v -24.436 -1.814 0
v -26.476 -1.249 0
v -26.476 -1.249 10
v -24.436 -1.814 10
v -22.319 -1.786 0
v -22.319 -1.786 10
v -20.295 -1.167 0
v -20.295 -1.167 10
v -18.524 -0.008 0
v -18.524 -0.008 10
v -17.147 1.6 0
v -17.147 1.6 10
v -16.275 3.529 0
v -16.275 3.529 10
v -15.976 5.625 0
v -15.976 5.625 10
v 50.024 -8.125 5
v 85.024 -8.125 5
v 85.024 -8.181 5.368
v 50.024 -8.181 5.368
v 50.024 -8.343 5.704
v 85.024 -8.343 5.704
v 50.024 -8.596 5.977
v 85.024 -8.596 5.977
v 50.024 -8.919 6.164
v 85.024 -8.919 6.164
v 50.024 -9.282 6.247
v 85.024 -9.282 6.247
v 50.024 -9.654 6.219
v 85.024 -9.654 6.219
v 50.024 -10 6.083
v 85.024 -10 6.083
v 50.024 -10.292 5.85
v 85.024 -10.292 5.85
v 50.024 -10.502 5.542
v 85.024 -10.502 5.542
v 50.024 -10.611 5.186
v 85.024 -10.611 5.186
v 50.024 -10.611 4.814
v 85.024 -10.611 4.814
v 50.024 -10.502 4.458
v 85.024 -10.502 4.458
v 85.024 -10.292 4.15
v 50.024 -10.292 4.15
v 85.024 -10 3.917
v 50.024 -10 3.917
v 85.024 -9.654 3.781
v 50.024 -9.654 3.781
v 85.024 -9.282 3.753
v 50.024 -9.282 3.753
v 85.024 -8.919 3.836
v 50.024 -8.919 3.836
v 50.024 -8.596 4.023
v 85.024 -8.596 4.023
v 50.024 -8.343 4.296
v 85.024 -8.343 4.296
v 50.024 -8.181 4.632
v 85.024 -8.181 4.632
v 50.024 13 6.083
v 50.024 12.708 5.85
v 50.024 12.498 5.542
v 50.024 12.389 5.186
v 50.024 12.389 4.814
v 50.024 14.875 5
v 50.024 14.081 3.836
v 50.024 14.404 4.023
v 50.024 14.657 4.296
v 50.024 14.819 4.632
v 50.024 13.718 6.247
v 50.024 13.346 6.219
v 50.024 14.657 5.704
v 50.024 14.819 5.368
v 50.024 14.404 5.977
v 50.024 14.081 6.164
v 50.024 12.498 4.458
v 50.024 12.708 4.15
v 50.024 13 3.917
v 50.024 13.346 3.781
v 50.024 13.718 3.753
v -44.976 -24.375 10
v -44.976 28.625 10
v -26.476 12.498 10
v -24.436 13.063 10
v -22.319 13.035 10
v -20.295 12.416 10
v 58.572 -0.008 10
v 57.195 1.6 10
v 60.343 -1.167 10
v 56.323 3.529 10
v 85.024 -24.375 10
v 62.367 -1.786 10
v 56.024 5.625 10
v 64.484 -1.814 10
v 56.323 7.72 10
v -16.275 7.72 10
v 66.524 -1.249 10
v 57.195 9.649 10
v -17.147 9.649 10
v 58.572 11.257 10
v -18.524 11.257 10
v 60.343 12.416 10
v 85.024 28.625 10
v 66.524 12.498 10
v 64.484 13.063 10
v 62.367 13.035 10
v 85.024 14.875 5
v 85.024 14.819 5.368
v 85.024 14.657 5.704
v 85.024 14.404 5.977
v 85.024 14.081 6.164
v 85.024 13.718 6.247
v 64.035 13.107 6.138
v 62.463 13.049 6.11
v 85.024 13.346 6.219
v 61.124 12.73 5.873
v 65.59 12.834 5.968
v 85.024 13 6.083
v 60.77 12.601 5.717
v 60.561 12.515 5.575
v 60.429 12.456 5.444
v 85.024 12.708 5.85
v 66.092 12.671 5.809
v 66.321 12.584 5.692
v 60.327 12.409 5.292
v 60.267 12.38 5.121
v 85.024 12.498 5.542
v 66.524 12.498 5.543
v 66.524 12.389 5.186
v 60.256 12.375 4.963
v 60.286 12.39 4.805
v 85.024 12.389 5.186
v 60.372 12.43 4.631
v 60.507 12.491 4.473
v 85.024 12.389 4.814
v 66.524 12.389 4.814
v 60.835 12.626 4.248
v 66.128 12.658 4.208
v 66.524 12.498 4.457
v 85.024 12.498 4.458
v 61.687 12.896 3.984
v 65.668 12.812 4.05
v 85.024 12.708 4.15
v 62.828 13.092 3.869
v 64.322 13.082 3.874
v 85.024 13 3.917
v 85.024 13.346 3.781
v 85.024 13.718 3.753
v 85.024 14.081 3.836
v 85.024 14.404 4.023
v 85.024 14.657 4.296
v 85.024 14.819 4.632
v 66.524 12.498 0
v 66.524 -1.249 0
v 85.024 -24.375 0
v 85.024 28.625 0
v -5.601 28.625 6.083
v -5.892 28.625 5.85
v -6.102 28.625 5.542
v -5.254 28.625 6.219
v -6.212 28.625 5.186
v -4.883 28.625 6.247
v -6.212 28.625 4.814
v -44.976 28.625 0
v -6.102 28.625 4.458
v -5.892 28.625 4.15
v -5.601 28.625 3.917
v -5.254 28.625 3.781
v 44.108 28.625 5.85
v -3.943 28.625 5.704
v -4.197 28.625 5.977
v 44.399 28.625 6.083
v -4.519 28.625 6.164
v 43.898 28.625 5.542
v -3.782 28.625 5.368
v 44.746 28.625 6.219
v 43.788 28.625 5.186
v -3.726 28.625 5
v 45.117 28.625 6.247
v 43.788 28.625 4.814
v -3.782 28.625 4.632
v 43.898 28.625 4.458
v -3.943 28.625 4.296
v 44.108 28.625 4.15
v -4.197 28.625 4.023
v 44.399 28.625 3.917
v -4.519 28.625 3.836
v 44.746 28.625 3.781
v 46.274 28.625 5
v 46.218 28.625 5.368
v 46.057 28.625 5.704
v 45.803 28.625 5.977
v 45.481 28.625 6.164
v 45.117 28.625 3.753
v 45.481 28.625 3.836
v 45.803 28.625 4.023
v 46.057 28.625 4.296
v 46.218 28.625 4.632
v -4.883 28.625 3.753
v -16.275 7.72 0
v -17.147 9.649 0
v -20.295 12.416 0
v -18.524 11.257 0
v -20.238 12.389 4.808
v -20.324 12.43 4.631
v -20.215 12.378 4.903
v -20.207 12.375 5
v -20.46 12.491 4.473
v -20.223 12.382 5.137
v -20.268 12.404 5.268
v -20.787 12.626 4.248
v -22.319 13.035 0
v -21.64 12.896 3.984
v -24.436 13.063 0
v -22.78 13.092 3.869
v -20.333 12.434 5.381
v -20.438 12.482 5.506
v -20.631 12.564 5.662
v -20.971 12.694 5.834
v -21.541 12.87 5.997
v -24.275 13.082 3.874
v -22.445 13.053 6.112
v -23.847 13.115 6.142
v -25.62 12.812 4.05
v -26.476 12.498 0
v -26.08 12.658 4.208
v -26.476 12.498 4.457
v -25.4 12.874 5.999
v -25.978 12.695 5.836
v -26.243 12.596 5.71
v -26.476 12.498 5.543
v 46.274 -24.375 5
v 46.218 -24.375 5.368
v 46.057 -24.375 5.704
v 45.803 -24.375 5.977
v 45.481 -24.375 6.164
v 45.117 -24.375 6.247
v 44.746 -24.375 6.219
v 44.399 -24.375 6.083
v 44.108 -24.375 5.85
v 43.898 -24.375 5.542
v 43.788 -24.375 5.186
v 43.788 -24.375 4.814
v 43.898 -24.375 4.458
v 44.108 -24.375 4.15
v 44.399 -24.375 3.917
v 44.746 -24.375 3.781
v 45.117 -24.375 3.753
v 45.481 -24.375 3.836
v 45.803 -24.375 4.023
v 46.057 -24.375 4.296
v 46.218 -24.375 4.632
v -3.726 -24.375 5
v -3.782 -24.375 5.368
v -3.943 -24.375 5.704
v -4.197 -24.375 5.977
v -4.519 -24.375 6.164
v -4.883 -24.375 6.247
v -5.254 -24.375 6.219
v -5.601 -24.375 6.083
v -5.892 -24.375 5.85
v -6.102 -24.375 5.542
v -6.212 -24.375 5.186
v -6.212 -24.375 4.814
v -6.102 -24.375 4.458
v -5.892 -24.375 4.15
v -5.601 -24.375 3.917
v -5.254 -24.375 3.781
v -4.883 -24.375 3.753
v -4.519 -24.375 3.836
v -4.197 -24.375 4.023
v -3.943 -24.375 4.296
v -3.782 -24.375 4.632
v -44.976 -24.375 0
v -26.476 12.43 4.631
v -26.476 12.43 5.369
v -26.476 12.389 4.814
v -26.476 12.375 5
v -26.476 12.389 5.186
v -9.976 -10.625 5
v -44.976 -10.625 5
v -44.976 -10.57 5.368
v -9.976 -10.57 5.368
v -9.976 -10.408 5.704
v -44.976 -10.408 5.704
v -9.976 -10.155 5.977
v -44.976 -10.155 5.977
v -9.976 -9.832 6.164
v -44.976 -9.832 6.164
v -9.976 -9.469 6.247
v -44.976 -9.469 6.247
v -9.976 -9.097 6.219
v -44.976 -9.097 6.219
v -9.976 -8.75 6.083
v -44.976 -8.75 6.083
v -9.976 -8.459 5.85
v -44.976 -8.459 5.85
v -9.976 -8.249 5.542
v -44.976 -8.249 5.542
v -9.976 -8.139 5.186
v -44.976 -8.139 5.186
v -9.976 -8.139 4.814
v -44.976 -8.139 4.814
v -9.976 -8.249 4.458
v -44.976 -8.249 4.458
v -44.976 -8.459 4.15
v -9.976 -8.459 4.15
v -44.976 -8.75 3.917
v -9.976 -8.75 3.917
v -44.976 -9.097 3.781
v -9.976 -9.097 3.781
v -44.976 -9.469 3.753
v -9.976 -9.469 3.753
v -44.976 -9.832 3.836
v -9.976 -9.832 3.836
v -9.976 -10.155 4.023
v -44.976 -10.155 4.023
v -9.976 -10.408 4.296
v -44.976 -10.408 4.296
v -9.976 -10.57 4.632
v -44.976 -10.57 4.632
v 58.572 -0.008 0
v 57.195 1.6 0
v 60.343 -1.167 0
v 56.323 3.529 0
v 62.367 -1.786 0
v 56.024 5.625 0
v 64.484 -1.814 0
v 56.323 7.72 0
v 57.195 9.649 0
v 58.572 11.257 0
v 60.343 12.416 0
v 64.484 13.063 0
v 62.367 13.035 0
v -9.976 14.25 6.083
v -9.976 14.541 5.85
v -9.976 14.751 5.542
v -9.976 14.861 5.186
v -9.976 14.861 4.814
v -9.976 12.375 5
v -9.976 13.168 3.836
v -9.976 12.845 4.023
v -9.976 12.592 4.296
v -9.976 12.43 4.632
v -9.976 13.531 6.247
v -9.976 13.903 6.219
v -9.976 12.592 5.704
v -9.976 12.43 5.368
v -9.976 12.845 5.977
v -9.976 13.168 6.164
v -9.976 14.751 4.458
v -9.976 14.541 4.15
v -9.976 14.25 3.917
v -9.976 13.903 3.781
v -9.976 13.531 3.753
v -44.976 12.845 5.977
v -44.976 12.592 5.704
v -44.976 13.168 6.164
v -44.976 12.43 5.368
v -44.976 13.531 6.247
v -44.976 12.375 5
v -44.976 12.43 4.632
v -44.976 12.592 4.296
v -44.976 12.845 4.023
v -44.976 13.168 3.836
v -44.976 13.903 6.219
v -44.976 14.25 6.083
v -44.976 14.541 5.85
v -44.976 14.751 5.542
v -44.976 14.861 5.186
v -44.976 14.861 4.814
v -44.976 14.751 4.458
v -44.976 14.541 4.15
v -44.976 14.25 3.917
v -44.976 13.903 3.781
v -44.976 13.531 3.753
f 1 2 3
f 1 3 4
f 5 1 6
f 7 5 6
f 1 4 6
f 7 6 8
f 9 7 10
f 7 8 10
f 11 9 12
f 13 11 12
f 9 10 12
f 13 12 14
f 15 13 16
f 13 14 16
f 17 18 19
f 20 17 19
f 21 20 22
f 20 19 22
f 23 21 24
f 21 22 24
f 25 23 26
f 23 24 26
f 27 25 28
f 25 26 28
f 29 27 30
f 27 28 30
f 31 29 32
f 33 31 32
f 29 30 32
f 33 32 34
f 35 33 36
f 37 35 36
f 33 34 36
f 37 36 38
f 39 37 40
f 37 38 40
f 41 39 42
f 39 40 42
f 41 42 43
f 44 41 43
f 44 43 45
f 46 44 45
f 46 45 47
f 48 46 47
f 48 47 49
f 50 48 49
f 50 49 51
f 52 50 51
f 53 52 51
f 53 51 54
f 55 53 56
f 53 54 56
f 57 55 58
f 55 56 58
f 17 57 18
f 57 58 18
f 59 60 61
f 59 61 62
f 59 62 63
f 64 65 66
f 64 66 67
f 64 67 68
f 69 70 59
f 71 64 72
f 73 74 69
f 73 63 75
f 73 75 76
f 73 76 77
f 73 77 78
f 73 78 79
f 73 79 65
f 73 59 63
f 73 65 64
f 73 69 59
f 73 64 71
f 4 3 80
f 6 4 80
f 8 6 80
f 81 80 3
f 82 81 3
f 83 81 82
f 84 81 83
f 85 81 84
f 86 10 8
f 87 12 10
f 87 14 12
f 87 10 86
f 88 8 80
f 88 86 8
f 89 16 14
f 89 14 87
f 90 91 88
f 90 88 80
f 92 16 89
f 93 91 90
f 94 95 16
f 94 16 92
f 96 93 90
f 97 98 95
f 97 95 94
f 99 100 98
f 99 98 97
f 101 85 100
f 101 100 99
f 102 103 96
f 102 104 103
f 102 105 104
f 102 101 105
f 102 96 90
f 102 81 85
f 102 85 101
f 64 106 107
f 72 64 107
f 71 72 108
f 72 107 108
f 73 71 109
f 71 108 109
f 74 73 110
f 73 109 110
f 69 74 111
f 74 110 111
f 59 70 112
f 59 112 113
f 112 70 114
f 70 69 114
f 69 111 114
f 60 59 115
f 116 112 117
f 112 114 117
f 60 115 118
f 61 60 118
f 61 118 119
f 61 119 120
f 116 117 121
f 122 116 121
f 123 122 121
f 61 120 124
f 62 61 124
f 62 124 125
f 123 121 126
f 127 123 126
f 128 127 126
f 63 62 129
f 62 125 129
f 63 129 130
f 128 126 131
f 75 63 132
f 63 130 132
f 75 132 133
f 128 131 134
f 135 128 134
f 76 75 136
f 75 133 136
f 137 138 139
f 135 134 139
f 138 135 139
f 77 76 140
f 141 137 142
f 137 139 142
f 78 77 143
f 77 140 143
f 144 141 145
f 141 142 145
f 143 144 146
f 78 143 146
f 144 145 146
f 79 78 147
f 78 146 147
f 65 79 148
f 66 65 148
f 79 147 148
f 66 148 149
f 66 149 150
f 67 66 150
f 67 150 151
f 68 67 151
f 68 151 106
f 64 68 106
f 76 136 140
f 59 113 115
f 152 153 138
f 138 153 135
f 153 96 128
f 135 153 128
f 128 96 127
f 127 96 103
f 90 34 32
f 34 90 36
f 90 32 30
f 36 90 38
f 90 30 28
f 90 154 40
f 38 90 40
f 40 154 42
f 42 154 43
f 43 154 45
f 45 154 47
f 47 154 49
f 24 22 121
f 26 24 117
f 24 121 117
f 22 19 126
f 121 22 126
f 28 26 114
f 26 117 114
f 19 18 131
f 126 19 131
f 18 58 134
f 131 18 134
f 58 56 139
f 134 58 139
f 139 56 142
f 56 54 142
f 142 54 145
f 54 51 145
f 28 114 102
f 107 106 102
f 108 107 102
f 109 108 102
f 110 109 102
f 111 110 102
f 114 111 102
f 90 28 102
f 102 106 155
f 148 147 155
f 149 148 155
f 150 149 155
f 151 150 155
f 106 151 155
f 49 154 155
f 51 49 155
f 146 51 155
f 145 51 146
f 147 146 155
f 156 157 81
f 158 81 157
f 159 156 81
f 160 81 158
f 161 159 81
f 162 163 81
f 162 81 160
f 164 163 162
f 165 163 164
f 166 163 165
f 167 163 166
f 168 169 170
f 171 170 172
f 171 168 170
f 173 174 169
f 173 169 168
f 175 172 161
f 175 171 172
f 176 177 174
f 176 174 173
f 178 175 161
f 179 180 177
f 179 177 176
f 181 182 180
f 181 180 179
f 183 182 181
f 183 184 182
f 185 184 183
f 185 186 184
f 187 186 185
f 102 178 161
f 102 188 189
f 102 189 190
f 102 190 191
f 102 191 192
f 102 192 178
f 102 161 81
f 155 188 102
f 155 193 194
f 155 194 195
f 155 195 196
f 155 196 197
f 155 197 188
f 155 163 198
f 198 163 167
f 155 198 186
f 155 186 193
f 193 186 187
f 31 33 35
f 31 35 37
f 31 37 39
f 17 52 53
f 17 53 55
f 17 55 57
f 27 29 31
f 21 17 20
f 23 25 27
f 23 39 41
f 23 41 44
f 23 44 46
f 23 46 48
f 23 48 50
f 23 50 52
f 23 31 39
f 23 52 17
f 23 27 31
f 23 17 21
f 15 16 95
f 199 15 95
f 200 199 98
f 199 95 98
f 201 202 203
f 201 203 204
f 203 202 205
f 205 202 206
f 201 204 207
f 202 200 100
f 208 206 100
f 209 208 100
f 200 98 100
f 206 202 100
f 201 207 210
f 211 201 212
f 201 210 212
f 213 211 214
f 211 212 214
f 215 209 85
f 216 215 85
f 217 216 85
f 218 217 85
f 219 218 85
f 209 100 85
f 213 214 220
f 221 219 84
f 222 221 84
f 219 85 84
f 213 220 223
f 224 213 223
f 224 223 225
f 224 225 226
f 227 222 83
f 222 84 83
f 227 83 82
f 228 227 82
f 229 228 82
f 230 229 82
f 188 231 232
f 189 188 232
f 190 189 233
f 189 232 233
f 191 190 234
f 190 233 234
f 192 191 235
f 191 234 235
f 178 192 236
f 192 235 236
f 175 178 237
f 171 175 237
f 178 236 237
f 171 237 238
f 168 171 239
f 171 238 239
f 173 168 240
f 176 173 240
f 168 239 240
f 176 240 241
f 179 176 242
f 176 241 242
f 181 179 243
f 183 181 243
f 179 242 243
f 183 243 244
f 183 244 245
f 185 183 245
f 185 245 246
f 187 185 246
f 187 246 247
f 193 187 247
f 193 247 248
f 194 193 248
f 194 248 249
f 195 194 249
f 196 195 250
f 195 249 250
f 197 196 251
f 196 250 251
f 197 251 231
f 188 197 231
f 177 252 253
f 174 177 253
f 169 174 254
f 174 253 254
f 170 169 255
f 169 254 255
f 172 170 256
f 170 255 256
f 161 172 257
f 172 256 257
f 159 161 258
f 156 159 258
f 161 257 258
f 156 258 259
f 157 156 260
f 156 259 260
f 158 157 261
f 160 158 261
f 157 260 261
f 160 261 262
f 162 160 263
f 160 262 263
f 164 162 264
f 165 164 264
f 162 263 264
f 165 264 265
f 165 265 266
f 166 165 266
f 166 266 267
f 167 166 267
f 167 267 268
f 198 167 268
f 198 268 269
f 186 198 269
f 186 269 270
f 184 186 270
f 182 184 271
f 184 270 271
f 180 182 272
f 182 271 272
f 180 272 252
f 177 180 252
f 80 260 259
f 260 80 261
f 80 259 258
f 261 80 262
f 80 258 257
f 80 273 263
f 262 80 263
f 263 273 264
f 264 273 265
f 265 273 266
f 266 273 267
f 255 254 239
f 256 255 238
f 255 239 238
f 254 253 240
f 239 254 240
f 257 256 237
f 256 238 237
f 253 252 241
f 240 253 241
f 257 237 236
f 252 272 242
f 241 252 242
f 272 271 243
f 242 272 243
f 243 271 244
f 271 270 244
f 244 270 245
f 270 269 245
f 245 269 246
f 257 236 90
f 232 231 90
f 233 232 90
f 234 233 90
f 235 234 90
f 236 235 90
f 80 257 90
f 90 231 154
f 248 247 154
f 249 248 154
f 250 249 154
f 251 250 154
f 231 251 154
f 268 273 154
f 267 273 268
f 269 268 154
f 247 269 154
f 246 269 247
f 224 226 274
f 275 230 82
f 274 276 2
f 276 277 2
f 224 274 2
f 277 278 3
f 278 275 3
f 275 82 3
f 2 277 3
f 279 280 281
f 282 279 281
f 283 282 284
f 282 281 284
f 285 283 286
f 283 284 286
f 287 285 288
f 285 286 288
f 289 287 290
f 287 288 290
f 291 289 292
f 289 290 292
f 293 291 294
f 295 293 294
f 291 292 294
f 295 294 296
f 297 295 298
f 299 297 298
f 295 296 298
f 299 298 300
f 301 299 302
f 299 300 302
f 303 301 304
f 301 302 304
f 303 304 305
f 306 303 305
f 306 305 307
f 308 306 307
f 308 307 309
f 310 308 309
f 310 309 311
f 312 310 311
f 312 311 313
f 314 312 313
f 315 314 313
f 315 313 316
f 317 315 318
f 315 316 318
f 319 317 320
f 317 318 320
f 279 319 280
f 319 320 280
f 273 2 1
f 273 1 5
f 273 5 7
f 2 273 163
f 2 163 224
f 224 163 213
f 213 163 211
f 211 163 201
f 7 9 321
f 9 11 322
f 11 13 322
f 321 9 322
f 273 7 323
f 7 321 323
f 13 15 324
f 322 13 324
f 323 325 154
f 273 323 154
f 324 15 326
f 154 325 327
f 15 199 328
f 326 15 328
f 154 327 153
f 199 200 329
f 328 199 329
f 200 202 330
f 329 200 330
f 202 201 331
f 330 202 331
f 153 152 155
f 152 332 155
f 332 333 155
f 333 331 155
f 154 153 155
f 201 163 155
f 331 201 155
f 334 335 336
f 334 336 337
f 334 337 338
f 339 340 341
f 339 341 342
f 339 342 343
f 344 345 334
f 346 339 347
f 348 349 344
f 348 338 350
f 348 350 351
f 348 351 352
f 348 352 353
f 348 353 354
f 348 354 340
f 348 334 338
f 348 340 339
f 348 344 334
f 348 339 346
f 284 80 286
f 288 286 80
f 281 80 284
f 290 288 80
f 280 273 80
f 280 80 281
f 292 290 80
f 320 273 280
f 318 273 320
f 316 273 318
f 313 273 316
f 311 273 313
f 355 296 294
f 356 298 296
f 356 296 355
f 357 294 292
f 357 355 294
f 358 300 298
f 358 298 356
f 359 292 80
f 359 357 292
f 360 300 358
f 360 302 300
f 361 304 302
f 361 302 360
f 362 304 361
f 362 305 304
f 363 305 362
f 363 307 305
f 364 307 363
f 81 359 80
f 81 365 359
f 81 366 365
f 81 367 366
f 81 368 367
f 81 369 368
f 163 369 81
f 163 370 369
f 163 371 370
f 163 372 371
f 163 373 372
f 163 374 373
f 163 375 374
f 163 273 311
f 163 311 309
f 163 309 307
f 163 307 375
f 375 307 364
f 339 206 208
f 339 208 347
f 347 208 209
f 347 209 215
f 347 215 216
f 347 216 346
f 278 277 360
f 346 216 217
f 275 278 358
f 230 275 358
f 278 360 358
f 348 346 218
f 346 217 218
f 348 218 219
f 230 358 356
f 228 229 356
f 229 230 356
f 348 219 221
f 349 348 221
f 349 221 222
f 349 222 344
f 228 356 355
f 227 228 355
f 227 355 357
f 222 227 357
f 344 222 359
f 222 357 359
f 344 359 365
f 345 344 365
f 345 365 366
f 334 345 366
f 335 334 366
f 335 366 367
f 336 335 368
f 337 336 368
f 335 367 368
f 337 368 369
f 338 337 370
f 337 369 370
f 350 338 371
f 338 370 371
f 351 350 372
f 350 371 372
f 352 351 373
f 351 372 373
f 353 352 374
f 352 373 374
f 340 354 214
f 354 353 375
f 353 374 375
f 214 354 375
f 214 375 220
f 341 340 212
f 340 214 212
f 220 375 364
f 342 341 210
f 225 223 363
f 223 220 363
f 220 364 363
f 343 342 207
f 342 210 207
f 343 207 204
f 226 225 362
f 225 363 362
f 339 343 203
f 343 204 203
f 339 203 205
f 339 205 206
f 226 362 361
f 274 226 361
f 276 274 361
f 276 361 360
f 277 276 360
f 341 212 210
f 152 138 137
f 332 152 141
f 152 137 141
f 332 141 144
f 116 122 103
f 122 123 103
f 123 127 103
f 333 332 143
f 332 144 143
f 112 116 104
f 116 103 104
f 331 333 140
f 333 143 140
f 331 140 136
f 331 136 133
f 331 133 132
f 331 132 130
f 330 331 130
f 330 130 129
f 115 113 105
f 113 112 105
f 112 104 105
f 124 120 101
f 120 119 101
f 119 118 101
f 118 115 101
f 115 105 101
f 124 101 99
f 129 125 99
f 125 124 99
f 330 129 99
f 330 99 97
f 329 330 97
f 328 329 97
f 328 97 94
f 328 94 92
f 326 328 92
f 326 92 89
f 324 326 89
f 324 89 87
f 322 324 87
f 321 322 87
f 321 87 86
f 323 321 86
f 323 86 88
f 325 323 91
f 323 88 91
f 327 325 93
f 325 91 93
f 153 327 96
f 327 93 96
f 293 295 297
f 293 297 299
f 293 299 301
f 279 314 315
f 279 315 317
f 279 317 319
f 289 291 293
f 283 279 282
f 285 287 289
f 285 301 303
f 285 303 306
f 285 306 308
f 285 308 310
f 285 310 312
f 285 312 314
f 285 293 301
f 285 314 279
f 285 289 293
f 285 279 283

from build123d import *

# Parameters (mm, degrees)
F0_W     = 130
F0_H     = 53
F1_DEPTH = 10
F2_R     = 1.25
F5_DEPTH = 35
F3_R     = 1.25
F6_DEPTH = 53
F4_R     = 1.25
F7_DEPTH = 35
F9_DEPTH = 10


with BuildPart() as f1:
    # F0 (on Top) → F1 (new body)
    with BuildSketch(Plane.XY):
        with Locations((20.023906, 2.124549)):
            Rectangle(F0_W, F0_H)
    extrude(amount=F1_DEPTH)

    # F2 (on face) → F5 (cut)
    with BuildSketch(Plane.YZ.offset(85.023906)):
        with Locations((-9.375451, 5)):
            Circle(F2_R)
        with Locations((13.624549, 5)):
            Circle(F2_R)
    extrude(amount=-F5_DEPTH, mode=Mode.SUBTRACT)

    # F3 (on face) → F6 (cut, through all)
    with BuildSketch(Plane.XZ.offset(24.375451)):
        with Locations((-4.976094, 5)):
            Circle(F3_R)
        with Locations((45.023906, 5)):
            Circle(F3_R)
    extrude(amount=-F6_DEPTH, mode=Mode.SUBTRACT)

    # F4 (on face) → F7 (cut)
    with BuildSketch(Plane(origin=(-44.976094, 0, 0), x_dir=(0, -1, 0), z_dir=(-1, 0, 0))):
        with Locations((-13.624549, 5)):
            Circle(F4_R)
        with Locations((9.375451, 5)):
            Circle(F4_R)
    extrude(amount=-F7_DEPTH, mode=Mode.SUBTRACT)

    # F8 (on face) → F9 (cut, through all)
    with BuildSketch(Plane.XY.offset(10)):
        with BuildLine():
            Line((66.523906, -1.249315), (66.523906, 12.498412))
            ThreePointArc((66.523906, 12.498412), (56.023906, 5.624549), (66.523906, -1.249315))
        make_face()
        with BuildLine():
            ThreePointArc((-26.476094, -1.249315), (-19.368175, -0.650401), (-15.976094, 5.624549))
            ThreePointArc((-15.976094, 5.624549), (-19.368175, 11.899499), (-26.476094, 12.498412))
            Line((-26.476094, 12.498412), (-26.476094, -1.249315))
        make_face()
    extrude(amount=-F9_DEPTH, mode=Mode.SUBTRACT)


solid = f1.part
